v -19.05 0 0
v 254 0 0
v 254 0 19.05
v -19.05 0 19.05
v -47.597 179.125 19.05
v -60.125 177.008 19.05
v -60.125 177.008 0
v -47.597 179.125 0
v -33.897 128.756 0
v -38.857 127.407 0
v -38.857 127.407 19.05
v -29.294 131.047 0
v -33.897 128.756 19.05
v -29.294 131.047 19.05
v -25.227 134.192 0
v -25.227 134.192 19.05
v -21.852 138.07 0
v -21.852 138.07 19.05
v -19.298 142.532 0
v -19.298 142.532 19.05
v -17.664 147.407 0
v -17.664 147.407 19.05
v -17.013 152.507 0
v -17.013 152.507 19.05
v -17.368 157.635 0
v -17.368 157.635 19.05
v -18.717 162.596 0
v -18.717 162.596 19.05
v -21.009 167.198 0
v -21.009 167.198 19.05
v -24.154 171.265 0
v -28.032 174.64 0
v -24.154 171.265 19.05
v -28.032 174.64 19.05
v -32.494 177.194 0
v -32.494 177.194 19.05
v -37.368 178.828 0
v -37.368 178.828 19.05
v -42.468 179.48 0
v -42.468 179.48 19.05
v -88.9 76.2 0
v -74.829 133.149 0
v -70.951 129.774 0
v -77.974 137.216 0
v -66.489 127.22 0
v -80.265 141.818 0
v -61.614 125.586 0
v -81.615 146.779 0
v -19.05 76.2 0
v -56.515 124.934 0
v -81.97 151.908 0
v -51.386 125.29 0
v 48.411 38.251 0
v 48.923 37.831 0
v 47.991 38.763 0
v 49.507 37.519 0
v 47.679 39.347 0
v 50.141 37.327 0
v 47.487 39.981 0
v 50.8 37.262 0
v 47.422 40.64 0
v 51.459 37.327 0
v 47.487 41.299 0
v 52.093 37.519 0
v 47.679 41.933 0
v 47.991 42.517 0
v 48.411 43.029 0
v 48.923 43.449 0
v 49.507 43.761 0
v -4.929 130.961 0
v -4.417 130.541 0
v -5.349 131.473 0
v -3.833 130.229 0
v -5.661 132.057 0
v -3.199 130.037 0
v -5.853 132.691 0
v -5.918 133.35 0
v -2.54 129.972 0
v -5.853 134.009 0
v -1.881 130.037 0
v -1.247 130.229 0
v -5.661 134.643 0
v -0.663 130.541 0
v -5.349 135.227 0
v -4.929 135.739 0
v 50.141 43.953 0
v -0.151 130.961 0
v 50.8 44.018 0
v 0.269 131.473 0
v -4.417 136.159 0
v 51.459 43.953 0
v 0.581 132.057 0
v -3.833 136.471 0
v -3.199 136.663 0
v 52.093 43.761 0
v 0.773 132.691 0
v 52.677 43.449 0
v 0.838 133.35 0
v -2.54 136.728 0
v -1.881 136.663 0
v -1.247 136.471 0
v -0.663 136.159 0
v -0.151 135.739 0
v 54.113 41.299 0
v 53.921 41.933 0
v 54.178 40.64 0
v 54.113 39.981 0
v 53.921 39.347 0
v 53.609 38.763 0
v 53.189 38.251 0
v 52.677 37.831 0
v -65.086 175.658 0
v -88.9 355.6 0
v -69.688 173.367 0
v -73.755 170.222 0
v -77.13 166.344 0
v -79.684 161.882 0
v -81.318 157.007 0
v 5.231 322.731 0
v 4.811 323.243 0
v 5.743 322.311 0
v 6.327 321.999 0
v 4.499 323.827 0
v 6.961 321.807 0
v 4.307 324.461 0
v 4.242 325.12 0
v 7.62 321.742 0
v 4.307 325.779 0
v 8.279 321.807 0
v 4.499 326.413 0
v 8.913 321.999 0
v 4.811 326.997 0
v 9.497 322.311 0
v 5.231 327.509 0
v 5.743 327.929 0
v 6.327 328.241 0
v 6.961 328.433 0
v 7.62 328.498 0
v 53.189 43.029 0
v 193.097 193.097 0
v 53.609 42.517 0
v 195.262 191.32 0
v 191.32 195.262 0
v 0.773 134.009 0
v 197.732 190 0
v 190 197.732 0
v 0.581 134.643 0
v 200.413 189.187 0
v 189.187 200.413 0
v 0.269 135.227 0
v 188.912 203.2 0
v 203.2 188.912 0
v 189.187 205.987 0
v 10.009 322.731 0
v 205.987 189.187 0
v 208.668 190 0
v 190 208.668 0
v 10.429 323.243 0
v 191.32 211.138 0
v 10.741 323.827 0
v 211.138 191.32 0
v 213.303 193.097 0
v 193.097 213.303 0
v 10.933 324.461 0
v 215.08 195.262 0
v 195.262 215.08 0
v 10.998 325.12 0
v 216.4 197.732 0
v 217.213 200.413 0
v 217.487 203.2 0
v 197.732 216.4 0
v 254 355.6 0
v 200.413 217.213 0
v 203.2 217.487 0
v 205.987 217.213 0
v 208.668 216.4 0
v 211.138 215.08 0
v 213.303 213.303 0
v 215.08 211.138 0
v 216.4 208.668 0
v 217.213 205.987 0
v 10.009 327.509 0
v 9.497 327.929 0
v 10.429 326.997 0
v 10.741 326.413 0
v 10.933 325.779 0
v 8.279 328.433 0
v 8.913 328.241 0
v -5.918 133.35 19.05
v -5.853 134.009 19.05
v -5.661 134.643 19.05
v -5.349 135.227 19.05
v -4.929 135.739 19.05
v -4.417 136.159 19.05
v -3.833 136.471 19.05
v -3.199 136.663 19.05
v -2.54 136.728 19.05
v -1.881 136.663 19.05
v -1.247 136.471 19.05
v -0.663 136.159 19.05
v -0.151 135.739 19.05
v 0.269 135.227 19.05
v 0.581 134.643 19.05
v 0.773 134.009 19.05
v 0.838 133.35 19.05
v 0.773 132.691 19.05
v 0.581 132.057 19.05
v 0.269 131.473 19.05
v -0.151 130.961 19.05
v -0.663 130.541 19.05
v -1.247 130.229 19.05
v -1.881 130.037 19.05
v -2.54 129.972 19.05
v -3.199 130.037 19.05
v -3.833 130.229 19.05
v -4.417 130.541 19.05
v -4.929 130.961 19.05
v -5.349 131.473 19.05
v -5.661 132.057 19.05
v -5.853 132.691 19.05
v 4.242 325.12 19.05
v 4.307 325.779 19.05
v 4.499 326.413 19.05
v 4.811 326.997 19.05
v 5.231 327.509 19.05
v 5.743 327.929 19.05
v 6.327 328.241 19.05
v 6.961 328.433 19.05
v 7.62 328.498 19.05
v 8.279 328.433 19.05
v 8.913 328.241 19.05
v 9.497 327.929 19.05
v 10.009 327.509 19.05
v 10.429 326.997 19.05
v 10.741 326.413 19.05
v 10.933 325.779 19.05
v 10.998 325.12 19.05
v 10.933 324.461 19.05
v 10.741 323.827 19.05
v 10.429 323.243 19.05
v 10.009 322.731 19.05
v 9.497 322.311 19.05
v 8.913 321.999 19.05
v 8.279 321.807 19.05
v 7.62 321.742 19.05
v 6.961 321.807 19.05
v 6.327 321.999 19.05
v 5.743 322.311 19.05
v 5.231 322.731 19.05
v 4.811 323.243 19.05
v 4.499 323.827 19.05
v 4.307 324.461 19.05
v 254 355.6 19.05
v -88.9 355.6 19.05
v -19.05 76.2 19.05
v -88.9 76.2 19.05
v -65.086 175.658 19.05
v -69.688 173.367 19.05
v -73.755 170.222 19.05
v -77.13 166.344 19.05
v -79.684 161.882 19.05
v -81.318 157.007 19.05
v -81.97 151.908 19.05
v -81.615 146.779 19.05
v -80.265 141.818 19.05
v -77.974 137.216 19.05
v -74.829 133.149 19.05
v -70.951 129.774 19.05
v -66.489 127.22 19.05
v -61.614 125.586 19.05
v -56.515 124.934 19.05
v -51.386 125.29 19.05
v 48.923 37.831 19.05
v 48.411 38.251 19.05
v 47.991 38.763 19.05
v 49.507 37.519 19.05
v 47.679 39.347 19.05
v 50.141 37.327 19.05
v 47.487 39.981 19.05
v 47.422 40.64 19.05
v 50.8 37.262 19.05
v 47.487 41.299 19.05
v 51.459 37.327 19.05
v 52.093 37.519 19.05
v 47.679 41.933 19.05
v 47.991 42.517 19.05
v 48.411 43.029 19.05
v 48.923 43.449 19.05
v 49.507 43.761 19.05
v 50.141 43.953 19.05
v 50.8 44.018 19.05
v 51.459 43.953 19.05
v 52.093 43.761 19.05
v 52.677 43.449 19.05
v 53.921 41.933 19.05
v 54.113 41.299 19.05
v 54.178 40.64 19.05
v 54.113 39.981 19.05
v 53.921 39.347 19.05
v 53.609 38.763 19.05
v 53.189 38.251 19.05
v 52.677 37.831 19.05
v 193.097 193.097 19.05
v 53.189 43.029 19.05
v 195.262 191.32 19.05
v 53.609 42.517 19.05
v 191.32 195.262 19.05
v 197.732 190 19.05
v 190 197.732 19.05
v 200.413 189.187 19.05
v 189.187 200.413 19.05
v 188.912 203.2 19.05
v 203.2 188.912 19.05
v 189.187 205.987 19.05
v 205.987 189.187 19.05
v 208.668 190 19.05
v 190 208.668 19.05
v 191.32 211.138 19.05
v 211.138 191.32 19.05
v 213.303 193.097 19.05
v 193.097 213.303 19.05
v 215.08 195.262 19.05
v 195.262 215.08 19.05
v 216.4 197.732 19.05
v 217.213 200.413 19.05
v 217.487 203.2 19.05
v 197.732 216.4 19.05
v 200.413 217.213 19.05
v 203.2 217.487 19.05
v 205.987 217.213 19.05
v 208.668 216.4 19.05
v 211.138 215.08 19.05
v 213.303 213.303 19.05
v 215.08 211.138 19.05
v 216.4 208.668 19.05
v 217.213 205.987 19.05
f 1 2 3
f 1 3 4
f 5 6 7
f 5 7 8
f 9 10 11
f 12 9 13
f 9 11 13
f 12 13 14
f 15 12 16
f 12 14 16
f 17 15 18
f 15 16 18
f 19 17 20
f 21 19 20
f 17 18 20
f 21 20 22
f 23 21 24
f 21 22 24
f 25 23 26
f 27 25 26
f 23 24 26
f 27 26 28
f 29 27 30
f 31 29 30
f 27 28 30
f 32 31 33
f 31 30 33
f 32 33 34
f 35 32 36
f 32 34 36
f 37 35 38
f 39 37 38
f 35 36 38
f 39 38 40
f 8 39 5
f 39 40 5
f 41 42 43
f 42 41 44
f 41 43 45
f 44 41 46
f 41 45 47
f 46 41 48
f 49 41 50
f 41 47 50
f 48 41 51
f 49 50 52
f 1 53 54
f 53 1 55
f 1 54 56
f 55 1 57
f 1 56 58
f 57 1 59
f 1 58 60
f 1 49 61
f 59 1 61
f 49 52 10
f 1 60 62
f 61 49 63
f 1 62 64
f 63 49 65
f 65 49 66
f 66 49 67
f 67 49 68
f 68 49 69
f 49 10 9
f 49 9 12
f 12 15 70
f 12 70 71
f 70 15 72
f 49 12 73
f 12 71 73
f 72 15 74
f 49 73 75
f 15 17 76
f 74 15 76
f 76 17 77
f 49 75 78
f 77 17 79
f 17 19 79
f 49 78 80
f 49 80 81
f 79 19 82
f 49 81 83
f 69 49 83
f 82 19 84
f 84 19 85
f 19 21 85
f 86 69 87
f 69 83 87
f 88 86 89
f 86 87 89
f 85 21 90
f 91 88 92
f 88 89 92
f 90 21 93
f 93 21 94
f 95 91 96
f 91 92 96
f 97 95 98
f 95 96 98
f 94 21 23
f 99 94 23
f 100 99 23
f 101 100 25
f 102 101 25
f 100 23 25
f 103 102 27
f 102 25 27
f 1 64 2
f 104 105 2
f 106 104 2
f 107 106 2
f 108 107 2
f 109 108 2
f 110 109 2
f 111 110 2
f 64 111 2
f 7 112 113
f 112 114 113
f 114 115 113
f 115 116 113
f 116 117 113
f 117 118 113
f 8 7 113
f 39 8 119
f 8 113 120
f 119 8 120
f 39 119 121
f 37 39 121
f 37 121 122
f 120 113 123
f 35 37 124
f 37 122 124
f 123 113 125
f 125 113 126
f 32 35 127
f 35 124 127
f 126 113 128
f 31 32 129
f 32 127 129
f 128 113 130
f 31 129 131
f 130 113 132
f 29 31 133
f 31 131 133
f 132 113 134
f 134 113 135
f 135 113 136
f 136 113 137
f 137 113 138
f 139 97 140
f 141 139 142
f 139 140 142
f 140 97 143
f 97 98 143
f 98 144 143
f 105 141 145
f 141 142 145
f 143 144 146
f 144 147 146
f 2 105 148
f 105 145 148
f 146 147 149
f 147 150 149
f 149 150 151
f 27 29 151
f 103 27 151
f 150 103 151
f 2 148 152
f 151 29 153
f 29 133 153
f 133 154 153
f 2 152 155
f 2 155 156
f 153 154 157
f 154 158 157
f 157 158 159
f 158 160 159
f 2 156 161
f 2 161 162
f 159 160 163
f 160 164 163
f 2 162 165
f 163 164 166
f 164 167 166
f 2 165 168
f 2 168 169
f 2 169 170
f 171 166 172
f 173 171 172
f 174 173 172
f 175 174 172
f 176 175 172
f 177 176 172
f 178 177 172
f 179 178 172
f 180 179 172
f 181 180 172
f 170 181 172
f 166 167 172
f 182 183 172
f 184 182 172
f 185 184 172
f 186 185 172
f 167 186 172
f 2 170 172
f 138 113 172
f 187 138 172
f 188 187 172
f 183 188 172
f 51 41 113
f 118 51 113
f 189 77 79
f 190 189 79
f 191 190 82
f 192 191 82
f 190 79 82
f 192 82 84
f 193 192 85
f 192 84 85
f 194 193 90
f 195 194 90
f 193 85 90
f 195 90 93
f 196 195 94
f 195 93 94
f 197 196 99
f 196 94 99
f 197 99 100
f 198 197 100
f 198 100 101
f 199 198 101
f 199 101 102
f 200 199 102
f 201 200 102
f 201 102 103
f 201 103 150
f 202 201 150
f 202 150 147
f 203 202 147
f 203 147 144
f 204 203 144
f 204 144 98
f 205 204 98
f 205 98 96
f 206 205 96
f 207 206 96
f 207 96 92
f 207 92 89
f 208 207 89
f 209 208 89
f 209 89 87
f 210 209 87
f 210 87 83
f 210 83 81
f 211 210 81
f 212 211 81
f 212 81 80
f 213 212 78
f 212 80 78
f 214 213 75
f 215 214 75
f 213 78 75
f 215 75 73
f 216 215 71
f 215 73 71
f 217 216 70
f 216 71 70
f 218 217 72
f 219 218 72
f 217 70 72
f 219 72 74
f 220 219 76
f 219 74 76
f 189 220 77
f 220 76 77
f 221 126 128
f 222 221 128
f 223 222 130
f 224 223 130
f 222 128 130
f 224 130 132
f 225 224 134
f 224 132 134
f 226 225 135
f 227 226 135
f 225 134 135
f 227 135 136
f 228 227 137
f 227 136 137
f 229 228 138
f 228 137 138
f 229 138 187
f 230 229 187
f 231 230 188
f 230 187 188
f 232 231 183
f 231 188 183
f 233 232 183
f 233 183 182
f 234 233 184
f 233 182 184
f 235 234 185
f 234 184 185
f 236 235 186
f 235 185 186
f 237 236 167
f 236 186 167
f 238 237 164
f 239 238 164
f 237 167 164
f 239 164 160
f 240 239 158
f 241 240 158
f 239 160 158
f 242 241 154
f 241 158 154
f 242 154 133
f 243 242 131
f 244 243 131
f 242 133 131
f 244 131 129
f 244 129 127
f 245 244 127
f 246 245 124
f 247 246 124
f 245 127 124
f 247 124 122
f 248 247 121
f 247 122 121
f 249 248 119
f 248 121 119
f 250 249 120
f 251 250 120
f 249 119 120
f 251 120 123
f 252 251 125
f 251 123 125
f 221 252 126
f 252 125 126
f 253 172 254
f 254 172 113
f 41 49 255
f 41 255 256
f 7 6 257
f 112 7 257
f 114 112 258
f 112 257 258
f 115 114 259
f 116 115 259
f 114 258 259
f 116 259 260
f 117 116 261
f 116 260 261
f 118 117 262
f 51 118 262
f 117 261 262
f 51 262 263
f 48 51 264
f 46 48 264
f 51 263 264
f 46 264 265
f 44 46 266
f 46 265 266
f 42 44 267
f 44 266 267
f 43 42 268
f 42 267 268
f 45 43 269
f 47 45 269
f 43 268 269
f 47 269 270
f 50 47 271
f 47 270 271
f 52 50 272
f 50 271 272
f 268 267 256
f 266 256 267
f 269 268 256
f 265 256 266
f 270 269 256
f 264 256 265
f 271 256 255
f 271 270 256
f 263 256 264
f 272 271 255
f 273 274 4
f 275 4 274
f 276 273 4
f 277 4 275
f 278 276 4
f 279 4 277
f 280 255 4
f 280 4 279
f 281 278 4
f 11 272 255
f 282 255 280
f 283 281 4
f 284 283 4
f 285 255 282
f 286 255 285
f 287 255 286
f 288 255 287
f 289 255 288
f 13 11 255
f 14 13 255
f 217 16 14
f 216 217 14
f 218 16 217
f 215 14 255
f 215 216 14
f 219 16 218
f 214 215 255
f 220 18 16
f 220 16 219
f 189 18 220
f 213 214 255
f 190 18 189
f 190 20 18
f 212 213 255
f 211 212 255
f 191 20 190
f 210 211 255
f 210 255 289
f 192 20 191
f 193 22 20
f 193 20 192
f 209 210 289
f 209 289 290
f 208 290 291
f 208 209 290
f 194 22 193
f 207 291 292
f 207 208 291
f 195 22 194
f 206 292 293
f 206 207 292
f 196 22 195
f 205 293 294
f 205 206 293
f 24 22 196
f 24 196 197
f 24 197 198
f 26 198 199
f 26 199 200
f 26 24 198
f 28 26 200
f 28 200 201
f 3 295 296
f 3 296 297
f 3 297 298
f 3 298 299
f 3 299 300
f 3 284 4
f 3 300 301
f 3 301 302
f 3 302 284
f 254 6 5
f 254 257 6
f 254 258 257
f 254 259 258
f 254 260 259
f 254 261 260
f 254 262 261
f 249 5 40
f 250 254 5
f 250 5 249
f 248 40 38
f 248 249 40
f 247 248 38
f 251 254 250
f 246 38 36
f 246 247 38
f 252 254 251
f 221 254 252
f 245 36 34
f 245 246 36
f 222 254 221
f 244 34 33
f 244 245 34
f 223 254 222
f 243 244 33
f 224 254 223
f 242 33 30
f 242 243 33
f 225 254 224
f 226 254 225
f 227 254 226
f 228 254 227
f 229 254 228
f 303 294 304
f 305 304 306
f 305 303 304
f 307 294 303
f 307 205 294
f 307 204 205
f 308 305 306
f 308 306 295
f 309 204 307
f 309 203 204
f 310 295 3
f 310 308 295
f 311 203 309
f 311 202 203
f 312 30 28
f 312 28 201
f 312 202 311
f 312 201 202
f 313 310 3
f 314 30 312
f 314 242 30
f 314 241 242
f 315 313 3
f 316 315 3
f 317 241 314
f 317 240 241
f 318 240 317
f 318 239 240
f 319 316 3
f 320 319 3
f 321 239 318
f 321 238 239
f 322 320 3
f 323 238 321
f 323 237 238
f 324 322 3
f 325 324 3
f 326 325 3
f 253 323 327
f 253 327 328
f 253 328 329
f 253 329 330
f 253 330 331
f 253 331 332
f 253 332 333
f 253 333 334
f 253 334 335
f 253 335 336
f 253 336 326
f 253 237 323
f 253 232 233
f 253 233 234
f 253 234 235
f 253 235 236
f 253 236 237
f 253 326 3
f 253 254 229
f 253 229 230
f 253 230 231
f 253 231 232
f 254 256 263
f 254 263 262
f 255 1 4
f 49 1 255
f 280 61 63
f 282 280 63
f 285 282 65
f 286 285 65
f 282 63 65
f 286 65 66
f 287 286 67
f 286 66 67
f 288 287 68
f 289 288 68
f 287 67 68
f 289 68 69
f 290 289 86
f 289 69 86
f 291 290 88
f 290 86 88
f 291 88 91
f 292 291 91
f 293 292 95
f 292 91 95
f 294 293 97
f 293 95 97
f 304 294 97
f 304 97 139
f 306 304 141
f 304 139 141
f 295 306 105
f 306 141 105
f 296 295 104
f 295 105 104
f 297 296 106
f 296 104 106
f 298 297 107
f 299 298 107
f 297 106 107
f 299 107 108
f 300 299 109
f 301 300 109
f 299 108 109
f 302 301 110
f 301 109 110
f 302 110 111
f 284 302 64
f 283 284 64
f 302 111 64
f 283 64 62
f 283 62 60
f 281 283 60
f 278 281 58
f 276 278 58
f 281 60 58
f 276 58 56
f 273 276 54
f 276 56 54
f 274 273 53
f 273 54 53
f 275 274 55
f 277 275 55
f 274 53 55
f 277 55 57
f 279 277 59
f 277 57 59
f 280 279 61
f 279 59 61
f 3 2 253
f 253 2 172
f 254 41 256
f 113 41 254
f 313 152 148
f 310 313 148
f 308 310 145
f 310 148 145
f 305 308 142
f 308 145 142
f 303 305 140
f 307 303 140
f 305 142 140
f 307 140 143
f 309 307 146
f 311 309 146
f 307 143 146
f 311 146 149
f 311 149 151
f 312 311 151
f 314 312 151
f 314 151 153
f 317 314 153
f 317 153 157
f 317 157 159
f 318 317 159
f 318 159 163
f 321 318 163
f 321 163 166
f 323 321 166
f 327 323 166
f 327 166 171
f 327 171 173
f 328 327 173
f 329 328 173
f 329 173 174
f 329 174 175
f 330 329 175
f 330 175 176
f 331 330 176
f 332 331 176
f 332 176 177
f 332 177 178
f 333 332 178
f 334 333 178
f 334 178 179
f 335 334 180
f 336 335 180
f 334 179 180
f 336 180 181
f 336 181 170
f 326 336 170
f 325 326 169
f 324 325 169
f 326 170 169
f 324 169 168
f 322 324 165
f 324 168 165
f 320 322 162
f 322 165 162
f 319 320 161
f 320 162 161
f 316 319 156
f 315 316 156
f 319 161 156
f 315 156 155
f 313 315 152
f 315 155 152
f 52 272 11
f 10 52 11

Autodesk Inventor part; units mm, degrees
ref_plane "YZ Plane" through (0, 0, 0) normal (1, 0, 0) x (0, 1, 0)
ref_plane "XZ Plane" through (0, 0, 0) normal (0, 1, 0) x (-1, 0, 0)
ref_plane "XY Plane" through (0, 0, 0) normal (0, 0, 1) x (1, 0, 0)
sketch "Neo Motor Mount" plane through (0, 0, 0) normal (0, 0, 1) x (1, 0, 0)
  line L0 (-30.6788, 181.9654) -> (-23.3726, 145.6169) construction
  line L1 (-43.3455, 180.5359) -> (-35.6081, 142.0424) construction
  arc A0 (-42.1579, 174.6277) -> (-41.2194, 169.9586) centre (-41.6886, 172.2931) ccw
  line L2 (-35.6081, 142.0424) -> (-32.6003, 127.0788) construction
  line L3 (-23.3726, 145.6169) -> (-20.1494, 129.5815) construction
  arc A1 (-35.0803, 139.4164) -> (-34.1417, 134.7473) centre (-34.611, 137.0818) ccw
  arc A2 (-21.6908, 137.25) -> (-22.6293, 141.9191) centre (-22.16, 139.5845) ccw
  line L4 (-35.0803, 139.4164) -> (-22.6293, 141.9191)
  line L5 (-34.1417, 134.7473) -> (-21.6908, 137.25)
  arc A3 (-77.3692, 167.55) -> (-76.4307, 162.8809) centre (-76.9, 165.2155) ccw
  arc A4 (-63.9797, 165.3836) -> (-64.9183, 170.0527) centre (-64.449, 167.7182) ccw
  arc A5 (-70.2916, 132.3387) -> (-69.3531, 127.6696) centre (-69.8223, 130.0042) ccw
  arc A6 (-56.9021, 130.1723) -> (-57.8406, 134.8414) centre (-57.3714, 132.5069) ccw
  line L6 (-70.2916, 132.3387) -> (-57.8406, 134.8414)
  line L7 (-69.3531, 127.6696) -> (-56.9021, 130.1723)
  line L8 (-77.3692, 167.55) -> (-64.9183, 170.0527)
  line L9 (-76.4307, 162.8809) -> (-63.9797, 165.3836)
  arc A7 (-28.7684, 172.4613) -> (-29.7069, 177.1304) centre (-29.2377, 174.7958) ccw
  line L10 (-42.1579, 174.6277) -> (-29.7069, 177.1304)
  line L11 (-41.2194, 169.9586) -> (-28.7684, 172.4613)
  line L12 (-45.711, 165.6236) -> (-40.743, 140.9077) construction
  line L13 (-58.0667, 162.6468) -> (-53.1939, 138.405) construction
  line L14 (-57.5073, 159.8642) -> (-45.1815, 162.9896)
  line L15 (-53.7533, 141.1877) -> (-41.4275, 144.3131)
  arc A8 (-57.5073, 159.8642) -> (-52.8309, 141.4216) centre (-55.6303, 150.5259) ccw
  arc A9 (-46.2915, 152.4) -> (-46.438, 153.0215) centre (-55.6303, 150.5259) ccw
  arc A10 (-49.53, 157.8411) -> (-51.2107, 158.9635) centre (-55.6303, 150.5259) ccw
  arc A11 (-52.747, 152.4) -> (-52.6427, 151.7743) centre (-43.3045, 153.6514) ccw
  arc A12 (-49.53, 160.8603) -> (-51.2107, 158.9635) centre (-43.3045, 153.6514) ccw
  arc A13 (-41.4275, 144.3131) -> (-46.1039, 162.7557) centre (-43.3045, 153.6514) ccw
  dimension "d55" = 4.7625
  dimension "d57" = 4.7625
  dimension "d58" = 4.7625
  dimension "d61" = 4.7625
  dimension "d62" = 4.7625
  dimension "d63" = 4.7625
  dimension "d64" = 4.7625
  dimension "d65" = 4.7625
  dimension "d67" = 24.7159
sketch "Sketch1" plane through (0, 0, 0) normal (0, 0, 1) x (1, 0, 0)
  line L0 (0, 0) -> (254, 0)
  line L1 (254, 0) -> (254, 355.6)
  line L2 (254, 355.6) -> (0, 355.6)
  line L3 (0, 355.6) -> (-88.9, 355.6)
  line L4 (-88.9, 355.6) -> (-88.9, 203.2)
  line L5 (0, 0) -> (-19.05, 0)
  line L6 (-19.05, 0) -> (-19.05, 76.2)
  line L7 (-19.05, 76.2) -> (-88.9, 76.2)
  line L8 (-88.9, 76.2) -> (-88.9, 203.2)
  circle A0 centre (226.06, 181.61) radius 3.3782
  dimension "d29" = 6.7564
  dimension "d0" = 254
  dimension "d1" = 355.6
  dimension "d17" = 88.9
  dimension "d18" = 69.85
  dimension "d19" = 76.2
  dimension "d21" = 6.7564
  dimension "d24" = 173.99
  dimension "d28" = 314.96
extrude "Extrusion1" add sketch "Sketch1" along normal blind 19.05 contours L5 L6 L7 L8 L4 L3 L2 L1 L0 | A0
sketch "Sketch2" plane through (0, 0, 19.05) normal (0, 0, 1) x (1, 0, 0)
  line L0 (0, 0) -> (254, 0) projected
  line L1 (254, 0) -> (254, 355.6) projected
  point P0 (203.2, 203.2)
  dimension "d11" = 203.2
  dimension "d12" = 50.8
hole "Hole1" at (203.2, 203.2, 19.05) direction (0, 0, -1) diameter 28.575 end through all
sketch "Sketch3" plane through (0, 0, 19.05) normal (0, 0, 1) x (1, 0, 0)
  point P0 (0, 0)
sketch "Sketch4" plane through (0, 0, 19.05) normal (0, 0, 1) x (1, 0, 0)
  point P0 (0, 0)
sketch "Sketch5" plane through (0, 0, 0) normal (0, 0, -1) x (-1, 0, 0)
  circle A0 centre (-7.62, 325.12) radius 3.3782
  circle A1 centre (2.54, 133.35) radius 3.3782
  circle A2 centre (-50.8, 40.64) radius 3.3782
  line L0 (-254, 0) -> (-254, 355.6) projected
  line L1 (-254, 355.6) -> (88.9, 355.6) projected
  line L2 (88.9, 76.2) -> (19.05, 76.2) construction
  line L3 (19.05, 76.2) -> (19.05, 374.6855) construction
  line L4 (19.05, 76.2) -> (19.05, 0) construction
  line L5 (19.05, 0) -> (-254, 0) construction
  point P0 (0, 0)
  dimension "d29" = 6.7564
  dimension "d30" = 6.7564
  dimension "d31" = 6.7564
  dimension "d32" = 246.38
  dimension "d33" = 256.54
  dimension "d34" = 203.2
  dimension "d35" = 30.48
  dimension "d36" = 222.25
  dimension "d37" = 314.96
  dimension "d40" = 16.51
  dimension "d42" = 26.67
  dimension "d43" = 40.64
  dimension "d44" = 133.35
  dimension "d45" = 325.12
  dimension "d46" = 69.85
extrude "Extrusion2" cut sketch "Sketch5" against normal through all
sketch "Sketch6" plane through (0, 0, 19.05) normal (0, 0, 1) x (1, 0, 0)
  line L0 (-114.6965, 152.4) -> (136.1638, 152.4) construction
  line L1 (-88.9, 355.6) -> (-88.9, 76.2) construction
  line L2 (-88.9, 76.2) -> (-19.05, 76.2) construction
  circle A0 centre (203.2, 203.2) radius 14.2875 construction
  line L3 (-49.53, 152.4) -> (203.2, 203.2) construction
  line L4 (-49.53, 152.4) -> (-245.9533, 112.9179) construction
  line L5 (-49.53, 44.7746) -> (-49.53, 143.2108) construction
  line L6 (-49.53, 146.4424) -> (-49.53, 372.917) construction
  line L7 (-58.0667, 162.6468) -> (-53.1939, 138.405) construction
  line L8 (-45.711, 165.6236) -> (-40.743, 140.9077) construction
  arc A1 (-38.8574, 127.4068) -> (-47.5966, 179.1246) centre (-43.227, 153.2657) ccw
  arc A2 (-60.1251, 177.0076) -> (-51.3859, 125.2897) centre (-55.7555, 151.1486) ccw
  line L9 (-60.1251, 177.0076) -> (-47.5966, 179.1246)
  line L10 (-51.3859, 125.2897) -> (-38.8574, 127.4068)
  point P0 (0, 0)
  point P1 (-57.5073, 159.8642)
  point P2 (-45.1815, 162.9896)
  point P3 (-53.7533, 141.1877)
  point P4 (-41.4275, 144.3131)
  point P5 (-47.5966, 179.1246)
  dimension "d48" = 76.2
  dimension "d83" = 24.7159
extrude "Extrusion4" cut sketch "Sketch6" against normal through all
properties part number "Shaft Mount with NEO mount" material "Wood (Maple)"
